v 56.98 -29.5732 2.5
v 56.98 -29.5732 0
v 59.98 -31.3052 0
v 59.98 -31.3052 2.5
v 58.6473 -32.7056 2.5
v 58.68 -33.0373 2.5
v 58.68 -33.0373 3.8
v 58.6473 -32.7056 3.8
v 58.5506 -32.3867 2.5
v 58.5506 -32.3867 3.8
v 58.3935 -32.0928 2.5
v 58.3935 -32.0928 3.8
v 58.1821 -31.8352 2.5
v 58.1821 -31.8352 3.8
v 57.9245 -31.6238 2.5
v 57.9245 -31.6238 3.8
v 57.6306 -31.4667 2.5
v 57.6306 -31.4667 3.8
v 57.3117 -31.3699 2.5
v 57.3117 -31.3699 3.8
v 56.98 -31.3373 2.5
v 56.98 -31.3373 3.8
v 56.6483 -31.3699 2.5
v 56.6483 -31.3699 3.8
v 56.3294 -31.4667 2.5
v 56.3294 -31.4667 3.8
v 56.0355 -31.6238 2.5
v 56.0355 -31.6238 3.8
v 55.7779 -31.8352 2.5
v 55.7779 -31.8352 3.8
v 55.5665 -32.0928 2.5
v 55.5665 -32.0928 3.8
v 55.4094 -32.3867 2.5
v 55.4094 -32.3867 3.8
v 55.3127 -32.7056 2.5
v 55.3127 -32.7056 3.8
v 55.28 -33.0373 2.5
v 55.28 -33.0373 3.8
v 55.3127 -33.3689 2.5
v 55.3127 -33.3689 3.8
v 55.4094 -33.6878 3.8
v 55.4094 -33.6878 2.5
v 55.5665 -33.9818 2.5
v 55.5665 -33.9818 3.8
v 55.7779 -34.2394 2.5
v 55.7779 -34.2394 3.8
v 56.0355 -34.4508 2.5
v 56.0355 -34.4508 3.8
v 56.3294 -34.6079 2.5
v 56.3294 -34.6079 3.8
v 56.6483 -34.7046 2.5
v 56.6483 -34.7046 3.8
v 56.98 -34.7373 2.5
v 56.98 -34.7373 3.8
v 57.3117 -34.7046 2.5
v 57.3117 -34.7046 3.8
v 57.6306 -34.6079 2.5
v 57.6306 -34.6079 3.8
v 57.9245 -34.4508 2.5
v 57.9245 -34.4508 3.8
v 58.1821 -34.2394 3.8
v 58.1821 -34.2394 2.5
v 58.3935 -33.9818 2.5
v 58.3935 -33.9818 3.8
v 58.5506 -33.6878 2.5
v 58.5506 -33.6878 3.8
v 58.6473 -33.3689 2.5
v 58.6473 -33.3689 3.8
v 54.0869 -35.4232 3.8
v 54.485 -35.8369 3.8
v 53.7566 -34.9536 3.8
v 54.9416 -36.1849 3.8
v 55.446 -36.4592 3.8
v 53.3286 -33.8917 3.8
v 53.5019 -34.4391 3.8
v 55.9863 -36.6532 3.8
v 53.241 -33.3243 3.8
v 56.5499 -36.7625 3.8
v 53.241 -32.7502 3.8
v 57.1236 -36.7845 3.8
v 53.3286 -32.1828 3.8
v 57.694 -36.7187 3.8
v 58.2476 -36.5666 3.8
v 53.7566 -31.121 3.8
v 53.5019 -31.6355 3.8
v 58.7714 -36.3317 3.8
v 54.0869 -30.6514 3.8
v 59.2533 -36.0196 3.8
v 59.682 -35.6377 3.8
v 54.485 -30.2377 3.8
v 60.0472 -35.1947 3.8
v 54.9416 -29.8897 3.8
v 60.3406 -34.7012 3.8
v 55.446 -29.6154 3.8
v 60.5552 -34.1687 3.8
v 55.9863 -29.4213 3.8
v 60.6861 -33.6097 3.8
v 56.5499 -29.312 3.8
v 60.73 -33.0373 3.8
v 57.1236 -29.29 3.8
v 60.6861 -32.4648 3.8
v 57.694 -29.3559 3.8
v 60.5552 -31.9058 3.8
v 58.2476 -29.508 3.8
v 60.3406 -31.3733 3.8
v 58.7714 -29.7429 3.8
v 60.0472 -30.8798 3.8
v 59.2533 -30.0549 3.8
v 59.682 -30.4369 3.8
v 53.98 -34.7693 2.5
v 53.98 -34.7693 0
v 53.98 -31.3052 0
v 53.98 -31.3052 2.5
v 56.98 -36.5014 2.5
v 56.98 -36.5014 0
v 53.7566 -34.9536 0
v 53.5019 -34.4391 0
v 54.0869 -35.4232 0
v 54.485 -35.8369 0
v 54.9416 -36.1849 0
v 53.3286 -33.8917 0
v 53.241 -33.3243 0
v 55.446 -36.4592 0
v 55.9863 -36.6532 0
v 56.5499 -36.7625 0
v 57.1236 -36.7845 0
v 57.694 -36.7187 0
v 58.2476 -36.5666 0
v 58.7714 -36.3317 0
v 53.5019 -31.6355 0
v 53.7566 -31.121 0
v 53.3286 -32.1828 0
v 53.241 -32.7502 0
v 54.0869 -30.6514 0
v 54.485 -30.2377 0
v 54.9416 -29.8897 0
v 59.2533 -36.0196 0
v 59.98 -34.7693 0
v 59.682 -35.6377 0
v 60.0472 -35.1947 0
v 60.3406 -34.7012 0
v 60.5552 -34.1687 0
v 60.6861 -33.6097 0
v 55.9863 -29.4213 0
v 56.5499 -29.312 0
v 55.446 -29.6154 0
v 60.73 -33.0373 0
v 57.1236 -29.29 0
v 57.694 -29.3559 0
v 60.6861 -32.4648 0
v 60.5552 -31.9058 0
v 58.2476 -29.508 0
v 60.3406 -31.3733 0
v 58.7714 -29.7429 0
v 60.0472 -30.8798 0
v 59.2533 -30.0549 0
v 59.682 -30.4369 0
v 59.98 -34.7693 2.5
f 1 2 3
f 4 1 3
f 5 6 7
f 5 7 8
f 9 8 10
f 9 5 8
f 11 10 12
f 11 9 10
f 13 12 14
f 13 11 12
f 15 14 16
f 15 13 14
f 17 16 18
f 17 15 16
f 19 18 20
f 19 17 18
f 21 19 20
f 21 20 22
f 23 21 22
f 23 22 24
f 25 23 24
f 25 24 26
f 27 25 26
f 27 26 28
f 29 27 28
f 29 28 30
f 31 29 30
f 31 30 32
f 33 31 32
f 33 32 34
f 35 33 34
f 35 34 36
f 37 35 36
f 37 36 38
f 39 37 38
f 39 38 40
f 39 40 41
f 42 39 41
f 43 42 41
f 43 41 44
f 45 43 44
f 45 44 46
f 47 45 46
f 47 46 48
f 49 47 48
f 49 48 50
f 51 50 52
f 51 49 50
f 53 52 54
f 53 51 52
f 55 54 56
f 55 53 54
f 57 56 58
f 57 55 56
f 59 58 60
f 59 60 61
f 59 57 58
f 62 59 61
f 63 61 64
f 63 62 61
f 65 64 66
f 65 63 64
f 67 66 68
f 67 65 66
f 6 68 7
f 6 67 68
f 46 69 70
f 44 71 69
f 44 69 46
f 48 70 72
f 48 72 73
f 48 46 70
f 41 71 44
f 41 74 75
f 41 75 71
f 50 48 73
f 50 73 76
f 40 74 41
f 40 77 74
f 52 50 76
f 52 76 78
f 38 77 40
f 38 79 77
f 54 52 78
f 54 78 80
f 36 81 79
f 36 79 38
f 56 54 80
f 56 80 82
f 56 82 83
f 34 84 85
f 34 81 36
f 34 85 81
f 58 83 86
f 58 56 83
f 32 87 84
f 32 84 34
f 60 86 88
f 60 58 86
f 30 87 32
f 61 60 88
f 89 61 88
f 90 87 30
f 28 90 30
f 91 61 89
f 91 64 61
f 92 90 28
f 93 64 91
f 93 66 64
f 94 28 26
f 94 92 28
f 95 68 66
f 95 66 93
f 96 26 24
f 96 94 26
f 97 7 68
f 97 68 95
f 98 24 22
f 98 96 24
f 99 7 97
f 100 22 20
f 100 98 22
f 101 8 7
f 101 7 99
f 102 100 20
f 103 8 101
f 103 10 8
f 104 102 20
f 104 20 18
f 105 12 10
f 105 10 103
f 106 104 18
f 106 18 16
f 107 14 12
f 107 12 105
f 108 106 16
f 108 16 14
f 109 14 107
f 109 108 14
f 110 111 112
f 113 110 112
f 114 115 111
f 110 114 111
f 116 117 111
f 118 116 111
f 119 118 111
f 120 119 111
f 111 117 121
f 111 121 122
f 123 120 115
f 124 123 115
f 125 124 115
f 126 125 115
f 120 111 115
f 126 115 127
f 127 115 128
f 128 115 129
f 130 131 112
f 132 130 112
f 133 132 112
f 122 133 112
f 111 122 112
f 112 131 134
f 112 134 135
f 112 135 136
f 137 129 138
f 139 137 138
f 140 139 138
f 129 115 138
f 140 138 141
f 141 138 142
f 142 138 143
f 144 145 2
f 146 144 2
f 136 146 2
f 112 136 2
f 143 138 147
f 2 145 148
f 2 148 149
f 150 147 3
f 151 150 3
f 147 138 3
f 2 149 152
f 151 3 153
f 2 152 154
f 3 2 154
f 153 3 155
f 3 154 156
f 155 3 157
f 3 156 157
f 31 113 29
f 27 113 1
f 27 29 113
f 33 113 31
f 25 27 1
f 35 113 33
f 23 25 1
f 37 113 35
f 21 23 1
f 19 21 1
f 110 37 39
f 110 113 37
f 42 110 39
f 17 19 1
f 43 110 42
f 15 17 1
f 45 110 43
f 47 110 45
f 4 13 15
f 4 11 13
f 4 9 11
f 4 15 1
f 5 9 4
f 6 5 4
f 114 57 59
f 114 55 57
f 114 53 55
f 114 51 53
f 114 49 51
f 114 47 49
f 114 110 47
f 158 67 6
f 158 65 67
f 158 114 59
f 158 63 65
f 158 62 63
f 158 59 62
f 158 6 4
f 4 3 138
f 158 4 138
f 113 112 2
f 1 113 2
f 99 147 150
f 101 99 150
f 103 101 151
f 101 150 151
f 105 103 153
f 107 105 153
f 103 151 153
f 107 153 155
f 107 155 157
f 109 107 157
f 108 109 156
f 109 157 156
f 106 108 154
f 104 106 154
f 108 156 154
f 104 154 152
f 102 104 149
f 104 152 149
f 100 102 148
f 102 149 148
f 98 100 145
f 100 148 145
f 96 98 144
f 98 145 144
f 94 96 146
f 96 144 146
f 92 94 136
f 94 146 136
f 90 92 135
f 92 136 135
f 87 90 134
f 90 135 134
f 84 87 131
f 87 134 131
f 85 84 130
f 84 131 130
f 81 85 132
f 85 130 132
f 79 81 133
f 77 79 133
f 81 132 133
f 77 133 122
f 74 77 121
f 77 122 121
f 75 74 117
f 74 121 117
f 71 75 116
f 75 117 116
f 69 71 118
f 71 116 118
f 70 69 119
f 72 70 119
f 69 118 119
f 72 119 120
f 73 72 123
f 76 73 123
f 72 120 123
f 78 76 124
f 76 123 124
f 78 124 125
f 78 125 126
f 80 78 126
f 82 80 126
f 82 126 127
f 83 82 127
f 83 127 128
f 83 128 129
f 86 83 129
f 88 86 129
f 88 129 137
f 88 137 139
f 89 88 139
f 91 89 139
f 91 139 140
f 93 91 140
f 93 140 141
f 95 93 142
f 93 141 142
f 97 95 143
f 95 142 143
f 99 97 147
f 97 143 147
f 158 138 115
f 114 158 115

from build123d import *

# Parameters (mm, degrees)
F0_R     = 3.75
F0_R_2   = 1.7
F1_DEPTH = 3.8
F3_DEPTH = 2.5


# Not quite as in the source:
# - a feature of the source that left no trace in its solid (it failed there, or was rolled back) is left out


with BuildPart() as f1:
    # F0 (on Top) → F1 (new body)
    with BuildSketch(Plane.XY):
        with Locations((56.9799989462, -33.0372825265)):
            Circle(F0_R)
        with Locations((56.9799989462, -33.0372825265)):
            Circle(F0_R_2, mode=Mode.SUBTRACT)
    extrude(amount=F1_DEPTH)

    # F2 (on face) → F3 (cut)
    with BuildSketch(Plane(origin=(0, 0, 0), x_dir=(1, 0, 0), z_dir=(0, 0, -1))):
        Polygon((59.9799989462, 31.3052317189), (59.9799989462, 34.7693333341), (56.9799989462, 36.5013841416), (53.9799989462, 34.7693333341), (53.9799989462, 31.3052317189), (56.9799989462, 29.5731809114), align=None)
    extrude(amount=-F3_DEPTH, mode=Mode.SUBTRACT)


solid = f1.part
